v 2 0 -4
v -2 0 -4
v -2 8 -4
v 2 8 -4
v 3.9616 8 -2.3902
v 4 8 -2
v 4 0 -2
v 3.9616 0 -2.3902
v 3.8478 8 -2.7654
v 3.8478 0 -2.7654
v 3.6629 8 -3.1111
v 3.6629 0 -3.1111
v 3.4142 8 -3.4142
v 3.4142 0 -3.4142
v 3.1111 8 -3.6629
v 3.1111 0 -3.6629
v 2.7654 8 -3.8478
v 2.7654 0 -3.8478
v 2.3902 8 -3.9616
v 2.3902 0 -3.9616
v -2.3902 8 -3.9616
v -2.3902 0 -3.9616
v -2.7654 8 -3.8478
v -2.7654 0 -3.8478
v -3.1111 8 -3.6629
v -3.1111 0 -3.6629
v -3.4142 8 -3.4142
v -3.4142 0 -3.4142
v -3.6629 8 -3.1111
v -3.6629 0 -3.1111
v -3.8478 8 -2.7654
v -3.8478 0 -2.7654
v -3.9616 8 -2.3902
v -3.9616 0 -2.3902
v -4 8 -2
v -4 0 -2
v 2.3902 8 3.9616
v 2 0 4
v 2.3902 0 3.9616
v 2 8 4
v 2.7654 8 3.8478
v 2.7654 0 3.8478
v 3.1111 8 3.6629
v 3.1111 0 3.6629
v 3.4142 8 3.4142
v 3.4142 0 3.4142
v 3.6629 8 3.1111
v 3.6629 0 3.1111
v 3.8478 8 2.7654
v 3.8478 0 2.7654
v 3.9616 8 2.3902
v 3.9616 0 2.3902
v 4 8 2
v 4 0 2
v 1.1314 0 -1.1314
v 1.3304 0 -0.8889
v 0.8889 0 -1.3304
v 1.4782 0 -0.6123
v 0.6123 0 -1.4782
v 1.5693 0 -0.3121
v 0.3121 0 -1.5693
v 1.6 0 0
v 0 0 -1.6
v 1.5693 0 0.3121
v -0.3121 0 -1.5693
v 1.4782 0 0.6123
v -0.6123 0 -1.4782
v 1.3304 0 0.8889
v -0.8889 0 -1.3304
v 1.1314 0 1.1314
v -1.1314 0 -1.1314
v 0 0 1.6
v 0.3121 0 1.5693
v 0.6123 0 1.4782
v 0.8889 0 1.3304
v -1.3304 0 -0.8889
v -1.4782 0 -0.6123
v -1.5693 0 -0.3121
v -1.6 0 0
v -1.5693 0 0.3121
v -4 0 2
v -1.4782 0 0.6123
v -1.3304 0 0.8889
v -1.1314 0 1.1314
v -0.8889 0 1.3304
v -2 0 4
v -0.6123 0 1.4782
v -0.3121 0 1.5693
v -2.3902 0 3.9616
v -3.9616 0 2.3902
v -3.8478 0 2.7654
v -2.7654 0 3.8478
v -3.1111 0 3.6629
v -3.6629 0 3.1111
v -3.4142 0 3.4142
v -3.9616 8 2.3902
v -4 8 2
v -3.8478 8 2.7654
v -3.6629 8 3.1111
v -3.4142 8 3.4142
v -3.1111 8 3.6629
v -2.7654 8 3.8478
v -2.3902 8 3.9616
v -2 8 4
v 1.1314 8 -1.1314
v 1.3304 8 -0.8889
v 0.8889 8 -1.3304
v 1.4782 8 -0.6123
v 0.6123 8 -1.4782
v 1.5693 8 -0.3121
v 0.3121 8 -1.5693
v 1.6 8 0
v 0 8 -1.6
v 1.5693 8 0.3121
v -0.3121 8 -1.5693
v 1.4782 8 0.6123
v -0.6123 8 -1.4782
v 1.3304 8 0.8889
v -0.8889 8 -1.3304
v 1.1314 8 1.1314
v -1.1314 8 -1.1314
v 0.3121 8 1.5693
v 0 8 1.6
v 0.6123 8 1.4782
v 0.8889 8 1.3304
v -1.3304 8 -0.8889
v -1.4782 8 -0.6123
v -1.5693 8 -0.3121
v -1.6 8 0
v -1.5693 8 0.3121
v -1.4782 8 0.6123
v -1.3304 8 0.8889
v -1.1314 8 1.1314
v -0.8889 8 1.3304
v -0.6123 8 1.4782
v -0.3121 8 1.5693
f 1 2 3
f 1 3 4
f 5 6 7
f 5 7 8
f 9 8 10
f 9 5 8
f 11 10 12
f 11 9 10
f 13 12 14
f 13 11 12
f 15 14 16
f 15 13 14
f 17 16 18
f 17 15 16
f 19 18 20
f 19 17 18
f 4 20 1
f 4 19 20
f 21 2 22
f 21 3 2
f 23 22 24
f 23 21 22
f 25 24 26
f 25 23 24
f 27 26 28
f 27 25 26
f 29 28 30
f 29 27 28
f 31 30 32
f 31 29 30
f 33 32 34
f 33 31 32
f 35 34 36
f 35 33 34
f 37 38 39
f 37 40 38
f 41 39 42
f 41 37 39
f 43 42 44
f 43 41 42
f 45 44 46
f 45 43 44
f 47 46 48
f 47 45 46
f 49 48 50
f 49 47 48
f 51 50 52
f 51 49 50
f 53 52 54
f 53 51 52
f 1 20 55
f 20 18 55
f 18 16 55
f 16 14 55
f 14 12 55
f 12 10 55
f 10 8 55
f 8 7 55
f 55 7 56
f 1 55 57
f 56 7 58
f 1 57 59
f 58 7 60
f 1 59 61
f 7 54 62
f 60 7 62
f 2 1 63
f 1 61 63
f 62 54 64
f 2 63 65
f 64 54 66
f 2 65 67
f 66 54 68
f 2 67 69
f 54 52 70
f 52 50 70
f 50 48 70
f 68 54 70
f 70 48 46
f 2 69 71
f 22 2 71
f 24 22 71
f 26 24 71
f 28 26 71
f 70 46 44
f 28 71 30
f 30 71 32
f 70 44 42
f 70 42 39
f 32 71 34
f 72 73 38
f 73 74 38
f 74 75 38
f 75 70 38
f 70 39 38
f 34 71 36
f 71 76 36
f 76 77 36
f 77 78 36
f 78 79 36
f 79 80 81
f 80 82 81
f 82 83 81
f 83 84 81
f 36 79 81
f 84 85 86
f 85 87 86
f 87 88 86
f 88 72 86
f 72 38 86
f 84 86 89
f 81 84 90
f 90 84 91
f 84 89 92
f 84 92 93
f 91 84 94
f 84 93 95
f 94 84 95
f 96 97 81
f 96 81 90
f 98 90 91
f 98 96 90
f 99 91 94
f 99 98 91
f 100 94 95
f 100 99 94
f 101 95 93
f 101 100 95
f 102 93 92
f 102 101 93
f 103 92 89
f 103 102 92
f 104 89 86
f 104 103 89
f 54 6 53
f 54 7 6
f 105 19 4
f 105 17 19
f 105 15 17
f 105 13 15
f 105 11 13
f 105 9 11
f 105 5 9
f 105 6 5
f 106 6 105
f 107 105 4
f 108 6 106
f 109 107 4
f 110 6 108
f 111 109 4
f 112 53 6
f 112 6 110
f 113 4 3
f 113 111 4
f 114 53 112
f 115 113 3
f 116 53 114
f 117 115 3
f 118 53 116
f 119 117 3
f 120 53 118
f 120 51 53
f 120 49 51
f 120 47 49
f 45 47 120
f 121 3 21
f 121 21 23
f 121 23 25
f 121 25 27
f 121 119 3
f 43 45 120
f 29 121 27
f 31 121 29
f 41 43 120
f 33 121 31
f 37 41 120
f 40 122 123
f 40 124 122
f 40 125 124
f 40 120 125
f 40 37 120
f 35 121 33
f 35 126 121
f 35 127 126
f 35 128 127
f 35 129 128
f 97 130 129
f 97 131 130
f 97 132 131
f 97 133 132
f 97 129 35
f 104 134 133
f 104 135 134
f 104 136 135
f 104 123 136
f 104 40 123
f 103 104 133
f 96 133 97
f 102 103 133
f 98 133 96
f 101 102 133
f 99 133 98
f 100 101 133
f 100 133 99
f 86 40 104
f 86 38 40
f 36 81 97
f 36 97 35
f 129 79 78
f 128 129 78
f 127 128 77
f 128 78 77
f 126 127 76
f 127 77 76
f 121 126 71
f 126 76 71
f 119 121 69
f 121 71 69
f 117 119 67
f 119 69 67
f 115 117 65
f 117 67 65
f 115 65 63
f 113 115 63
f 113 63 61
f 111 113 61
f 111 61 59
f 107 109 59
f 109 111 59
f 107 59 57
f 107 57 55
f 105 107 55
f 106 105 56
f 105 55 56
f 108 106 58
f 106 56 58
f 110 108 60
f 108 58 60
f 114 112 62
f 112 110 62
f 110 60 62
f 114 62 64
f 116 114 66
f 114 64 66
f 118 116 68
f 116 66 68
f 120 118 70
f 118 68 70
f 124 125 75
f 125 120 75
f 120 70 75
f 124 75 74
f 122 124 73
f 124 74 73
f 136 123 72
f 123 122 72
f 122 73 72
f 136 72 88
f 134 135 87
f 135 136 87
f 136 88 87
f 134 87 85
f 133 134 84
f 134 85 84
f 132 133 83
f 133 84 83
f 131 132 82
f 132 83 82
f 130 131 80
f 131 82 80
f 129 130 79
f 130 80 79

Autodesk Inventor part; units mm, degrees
ref_plane "YZ Plane" through (0, 0, 0) normal (1, 0, 0) x (0, 1, 0)
ref_plane "XZ Plane" through (0, 0, 0) normal (0, 1, 0) x (-1, 0, 0)
ref_plane "XY Plane" through (0, 0, 0) normal (0, 0, 1) x (1, 0, 0)
sketch "Sketch1" plane through (0, 0, 0) normal (0, 1, 0) x (-1, 0, 0)
  circle A0 centre (0, 0) radius 2.5
  circle A1 centre (0, 0) radius 1.6
  line L0 (4, -4) -> (-4, -4)
  line L1 (-4, -4) -> (-4, 4)
  line L2 (-4, 4) -> (4, 4)
  line L3 (4, 4) -> (4, -4)
  line L4 (4, -4) -> (-4, 4) construction
  line L5 (-4, -4) -> (4, 4) construction
  dimension "d0" = 5
  dimension "d1" = 3.2
  dimension "d11" = 8
  dimension "d12" = 8
extrude "Extrusion1" add sketch "Sketch1" along normal blind 8 contours A0 | L0 L1 L2 L3
fillet "Fillet1" radius 2 4 edges at (4, 4, 4) (-4, 4, 4) (4, 4, -4) (-4, 4, -4)
properties part number "8mm Spacer"
